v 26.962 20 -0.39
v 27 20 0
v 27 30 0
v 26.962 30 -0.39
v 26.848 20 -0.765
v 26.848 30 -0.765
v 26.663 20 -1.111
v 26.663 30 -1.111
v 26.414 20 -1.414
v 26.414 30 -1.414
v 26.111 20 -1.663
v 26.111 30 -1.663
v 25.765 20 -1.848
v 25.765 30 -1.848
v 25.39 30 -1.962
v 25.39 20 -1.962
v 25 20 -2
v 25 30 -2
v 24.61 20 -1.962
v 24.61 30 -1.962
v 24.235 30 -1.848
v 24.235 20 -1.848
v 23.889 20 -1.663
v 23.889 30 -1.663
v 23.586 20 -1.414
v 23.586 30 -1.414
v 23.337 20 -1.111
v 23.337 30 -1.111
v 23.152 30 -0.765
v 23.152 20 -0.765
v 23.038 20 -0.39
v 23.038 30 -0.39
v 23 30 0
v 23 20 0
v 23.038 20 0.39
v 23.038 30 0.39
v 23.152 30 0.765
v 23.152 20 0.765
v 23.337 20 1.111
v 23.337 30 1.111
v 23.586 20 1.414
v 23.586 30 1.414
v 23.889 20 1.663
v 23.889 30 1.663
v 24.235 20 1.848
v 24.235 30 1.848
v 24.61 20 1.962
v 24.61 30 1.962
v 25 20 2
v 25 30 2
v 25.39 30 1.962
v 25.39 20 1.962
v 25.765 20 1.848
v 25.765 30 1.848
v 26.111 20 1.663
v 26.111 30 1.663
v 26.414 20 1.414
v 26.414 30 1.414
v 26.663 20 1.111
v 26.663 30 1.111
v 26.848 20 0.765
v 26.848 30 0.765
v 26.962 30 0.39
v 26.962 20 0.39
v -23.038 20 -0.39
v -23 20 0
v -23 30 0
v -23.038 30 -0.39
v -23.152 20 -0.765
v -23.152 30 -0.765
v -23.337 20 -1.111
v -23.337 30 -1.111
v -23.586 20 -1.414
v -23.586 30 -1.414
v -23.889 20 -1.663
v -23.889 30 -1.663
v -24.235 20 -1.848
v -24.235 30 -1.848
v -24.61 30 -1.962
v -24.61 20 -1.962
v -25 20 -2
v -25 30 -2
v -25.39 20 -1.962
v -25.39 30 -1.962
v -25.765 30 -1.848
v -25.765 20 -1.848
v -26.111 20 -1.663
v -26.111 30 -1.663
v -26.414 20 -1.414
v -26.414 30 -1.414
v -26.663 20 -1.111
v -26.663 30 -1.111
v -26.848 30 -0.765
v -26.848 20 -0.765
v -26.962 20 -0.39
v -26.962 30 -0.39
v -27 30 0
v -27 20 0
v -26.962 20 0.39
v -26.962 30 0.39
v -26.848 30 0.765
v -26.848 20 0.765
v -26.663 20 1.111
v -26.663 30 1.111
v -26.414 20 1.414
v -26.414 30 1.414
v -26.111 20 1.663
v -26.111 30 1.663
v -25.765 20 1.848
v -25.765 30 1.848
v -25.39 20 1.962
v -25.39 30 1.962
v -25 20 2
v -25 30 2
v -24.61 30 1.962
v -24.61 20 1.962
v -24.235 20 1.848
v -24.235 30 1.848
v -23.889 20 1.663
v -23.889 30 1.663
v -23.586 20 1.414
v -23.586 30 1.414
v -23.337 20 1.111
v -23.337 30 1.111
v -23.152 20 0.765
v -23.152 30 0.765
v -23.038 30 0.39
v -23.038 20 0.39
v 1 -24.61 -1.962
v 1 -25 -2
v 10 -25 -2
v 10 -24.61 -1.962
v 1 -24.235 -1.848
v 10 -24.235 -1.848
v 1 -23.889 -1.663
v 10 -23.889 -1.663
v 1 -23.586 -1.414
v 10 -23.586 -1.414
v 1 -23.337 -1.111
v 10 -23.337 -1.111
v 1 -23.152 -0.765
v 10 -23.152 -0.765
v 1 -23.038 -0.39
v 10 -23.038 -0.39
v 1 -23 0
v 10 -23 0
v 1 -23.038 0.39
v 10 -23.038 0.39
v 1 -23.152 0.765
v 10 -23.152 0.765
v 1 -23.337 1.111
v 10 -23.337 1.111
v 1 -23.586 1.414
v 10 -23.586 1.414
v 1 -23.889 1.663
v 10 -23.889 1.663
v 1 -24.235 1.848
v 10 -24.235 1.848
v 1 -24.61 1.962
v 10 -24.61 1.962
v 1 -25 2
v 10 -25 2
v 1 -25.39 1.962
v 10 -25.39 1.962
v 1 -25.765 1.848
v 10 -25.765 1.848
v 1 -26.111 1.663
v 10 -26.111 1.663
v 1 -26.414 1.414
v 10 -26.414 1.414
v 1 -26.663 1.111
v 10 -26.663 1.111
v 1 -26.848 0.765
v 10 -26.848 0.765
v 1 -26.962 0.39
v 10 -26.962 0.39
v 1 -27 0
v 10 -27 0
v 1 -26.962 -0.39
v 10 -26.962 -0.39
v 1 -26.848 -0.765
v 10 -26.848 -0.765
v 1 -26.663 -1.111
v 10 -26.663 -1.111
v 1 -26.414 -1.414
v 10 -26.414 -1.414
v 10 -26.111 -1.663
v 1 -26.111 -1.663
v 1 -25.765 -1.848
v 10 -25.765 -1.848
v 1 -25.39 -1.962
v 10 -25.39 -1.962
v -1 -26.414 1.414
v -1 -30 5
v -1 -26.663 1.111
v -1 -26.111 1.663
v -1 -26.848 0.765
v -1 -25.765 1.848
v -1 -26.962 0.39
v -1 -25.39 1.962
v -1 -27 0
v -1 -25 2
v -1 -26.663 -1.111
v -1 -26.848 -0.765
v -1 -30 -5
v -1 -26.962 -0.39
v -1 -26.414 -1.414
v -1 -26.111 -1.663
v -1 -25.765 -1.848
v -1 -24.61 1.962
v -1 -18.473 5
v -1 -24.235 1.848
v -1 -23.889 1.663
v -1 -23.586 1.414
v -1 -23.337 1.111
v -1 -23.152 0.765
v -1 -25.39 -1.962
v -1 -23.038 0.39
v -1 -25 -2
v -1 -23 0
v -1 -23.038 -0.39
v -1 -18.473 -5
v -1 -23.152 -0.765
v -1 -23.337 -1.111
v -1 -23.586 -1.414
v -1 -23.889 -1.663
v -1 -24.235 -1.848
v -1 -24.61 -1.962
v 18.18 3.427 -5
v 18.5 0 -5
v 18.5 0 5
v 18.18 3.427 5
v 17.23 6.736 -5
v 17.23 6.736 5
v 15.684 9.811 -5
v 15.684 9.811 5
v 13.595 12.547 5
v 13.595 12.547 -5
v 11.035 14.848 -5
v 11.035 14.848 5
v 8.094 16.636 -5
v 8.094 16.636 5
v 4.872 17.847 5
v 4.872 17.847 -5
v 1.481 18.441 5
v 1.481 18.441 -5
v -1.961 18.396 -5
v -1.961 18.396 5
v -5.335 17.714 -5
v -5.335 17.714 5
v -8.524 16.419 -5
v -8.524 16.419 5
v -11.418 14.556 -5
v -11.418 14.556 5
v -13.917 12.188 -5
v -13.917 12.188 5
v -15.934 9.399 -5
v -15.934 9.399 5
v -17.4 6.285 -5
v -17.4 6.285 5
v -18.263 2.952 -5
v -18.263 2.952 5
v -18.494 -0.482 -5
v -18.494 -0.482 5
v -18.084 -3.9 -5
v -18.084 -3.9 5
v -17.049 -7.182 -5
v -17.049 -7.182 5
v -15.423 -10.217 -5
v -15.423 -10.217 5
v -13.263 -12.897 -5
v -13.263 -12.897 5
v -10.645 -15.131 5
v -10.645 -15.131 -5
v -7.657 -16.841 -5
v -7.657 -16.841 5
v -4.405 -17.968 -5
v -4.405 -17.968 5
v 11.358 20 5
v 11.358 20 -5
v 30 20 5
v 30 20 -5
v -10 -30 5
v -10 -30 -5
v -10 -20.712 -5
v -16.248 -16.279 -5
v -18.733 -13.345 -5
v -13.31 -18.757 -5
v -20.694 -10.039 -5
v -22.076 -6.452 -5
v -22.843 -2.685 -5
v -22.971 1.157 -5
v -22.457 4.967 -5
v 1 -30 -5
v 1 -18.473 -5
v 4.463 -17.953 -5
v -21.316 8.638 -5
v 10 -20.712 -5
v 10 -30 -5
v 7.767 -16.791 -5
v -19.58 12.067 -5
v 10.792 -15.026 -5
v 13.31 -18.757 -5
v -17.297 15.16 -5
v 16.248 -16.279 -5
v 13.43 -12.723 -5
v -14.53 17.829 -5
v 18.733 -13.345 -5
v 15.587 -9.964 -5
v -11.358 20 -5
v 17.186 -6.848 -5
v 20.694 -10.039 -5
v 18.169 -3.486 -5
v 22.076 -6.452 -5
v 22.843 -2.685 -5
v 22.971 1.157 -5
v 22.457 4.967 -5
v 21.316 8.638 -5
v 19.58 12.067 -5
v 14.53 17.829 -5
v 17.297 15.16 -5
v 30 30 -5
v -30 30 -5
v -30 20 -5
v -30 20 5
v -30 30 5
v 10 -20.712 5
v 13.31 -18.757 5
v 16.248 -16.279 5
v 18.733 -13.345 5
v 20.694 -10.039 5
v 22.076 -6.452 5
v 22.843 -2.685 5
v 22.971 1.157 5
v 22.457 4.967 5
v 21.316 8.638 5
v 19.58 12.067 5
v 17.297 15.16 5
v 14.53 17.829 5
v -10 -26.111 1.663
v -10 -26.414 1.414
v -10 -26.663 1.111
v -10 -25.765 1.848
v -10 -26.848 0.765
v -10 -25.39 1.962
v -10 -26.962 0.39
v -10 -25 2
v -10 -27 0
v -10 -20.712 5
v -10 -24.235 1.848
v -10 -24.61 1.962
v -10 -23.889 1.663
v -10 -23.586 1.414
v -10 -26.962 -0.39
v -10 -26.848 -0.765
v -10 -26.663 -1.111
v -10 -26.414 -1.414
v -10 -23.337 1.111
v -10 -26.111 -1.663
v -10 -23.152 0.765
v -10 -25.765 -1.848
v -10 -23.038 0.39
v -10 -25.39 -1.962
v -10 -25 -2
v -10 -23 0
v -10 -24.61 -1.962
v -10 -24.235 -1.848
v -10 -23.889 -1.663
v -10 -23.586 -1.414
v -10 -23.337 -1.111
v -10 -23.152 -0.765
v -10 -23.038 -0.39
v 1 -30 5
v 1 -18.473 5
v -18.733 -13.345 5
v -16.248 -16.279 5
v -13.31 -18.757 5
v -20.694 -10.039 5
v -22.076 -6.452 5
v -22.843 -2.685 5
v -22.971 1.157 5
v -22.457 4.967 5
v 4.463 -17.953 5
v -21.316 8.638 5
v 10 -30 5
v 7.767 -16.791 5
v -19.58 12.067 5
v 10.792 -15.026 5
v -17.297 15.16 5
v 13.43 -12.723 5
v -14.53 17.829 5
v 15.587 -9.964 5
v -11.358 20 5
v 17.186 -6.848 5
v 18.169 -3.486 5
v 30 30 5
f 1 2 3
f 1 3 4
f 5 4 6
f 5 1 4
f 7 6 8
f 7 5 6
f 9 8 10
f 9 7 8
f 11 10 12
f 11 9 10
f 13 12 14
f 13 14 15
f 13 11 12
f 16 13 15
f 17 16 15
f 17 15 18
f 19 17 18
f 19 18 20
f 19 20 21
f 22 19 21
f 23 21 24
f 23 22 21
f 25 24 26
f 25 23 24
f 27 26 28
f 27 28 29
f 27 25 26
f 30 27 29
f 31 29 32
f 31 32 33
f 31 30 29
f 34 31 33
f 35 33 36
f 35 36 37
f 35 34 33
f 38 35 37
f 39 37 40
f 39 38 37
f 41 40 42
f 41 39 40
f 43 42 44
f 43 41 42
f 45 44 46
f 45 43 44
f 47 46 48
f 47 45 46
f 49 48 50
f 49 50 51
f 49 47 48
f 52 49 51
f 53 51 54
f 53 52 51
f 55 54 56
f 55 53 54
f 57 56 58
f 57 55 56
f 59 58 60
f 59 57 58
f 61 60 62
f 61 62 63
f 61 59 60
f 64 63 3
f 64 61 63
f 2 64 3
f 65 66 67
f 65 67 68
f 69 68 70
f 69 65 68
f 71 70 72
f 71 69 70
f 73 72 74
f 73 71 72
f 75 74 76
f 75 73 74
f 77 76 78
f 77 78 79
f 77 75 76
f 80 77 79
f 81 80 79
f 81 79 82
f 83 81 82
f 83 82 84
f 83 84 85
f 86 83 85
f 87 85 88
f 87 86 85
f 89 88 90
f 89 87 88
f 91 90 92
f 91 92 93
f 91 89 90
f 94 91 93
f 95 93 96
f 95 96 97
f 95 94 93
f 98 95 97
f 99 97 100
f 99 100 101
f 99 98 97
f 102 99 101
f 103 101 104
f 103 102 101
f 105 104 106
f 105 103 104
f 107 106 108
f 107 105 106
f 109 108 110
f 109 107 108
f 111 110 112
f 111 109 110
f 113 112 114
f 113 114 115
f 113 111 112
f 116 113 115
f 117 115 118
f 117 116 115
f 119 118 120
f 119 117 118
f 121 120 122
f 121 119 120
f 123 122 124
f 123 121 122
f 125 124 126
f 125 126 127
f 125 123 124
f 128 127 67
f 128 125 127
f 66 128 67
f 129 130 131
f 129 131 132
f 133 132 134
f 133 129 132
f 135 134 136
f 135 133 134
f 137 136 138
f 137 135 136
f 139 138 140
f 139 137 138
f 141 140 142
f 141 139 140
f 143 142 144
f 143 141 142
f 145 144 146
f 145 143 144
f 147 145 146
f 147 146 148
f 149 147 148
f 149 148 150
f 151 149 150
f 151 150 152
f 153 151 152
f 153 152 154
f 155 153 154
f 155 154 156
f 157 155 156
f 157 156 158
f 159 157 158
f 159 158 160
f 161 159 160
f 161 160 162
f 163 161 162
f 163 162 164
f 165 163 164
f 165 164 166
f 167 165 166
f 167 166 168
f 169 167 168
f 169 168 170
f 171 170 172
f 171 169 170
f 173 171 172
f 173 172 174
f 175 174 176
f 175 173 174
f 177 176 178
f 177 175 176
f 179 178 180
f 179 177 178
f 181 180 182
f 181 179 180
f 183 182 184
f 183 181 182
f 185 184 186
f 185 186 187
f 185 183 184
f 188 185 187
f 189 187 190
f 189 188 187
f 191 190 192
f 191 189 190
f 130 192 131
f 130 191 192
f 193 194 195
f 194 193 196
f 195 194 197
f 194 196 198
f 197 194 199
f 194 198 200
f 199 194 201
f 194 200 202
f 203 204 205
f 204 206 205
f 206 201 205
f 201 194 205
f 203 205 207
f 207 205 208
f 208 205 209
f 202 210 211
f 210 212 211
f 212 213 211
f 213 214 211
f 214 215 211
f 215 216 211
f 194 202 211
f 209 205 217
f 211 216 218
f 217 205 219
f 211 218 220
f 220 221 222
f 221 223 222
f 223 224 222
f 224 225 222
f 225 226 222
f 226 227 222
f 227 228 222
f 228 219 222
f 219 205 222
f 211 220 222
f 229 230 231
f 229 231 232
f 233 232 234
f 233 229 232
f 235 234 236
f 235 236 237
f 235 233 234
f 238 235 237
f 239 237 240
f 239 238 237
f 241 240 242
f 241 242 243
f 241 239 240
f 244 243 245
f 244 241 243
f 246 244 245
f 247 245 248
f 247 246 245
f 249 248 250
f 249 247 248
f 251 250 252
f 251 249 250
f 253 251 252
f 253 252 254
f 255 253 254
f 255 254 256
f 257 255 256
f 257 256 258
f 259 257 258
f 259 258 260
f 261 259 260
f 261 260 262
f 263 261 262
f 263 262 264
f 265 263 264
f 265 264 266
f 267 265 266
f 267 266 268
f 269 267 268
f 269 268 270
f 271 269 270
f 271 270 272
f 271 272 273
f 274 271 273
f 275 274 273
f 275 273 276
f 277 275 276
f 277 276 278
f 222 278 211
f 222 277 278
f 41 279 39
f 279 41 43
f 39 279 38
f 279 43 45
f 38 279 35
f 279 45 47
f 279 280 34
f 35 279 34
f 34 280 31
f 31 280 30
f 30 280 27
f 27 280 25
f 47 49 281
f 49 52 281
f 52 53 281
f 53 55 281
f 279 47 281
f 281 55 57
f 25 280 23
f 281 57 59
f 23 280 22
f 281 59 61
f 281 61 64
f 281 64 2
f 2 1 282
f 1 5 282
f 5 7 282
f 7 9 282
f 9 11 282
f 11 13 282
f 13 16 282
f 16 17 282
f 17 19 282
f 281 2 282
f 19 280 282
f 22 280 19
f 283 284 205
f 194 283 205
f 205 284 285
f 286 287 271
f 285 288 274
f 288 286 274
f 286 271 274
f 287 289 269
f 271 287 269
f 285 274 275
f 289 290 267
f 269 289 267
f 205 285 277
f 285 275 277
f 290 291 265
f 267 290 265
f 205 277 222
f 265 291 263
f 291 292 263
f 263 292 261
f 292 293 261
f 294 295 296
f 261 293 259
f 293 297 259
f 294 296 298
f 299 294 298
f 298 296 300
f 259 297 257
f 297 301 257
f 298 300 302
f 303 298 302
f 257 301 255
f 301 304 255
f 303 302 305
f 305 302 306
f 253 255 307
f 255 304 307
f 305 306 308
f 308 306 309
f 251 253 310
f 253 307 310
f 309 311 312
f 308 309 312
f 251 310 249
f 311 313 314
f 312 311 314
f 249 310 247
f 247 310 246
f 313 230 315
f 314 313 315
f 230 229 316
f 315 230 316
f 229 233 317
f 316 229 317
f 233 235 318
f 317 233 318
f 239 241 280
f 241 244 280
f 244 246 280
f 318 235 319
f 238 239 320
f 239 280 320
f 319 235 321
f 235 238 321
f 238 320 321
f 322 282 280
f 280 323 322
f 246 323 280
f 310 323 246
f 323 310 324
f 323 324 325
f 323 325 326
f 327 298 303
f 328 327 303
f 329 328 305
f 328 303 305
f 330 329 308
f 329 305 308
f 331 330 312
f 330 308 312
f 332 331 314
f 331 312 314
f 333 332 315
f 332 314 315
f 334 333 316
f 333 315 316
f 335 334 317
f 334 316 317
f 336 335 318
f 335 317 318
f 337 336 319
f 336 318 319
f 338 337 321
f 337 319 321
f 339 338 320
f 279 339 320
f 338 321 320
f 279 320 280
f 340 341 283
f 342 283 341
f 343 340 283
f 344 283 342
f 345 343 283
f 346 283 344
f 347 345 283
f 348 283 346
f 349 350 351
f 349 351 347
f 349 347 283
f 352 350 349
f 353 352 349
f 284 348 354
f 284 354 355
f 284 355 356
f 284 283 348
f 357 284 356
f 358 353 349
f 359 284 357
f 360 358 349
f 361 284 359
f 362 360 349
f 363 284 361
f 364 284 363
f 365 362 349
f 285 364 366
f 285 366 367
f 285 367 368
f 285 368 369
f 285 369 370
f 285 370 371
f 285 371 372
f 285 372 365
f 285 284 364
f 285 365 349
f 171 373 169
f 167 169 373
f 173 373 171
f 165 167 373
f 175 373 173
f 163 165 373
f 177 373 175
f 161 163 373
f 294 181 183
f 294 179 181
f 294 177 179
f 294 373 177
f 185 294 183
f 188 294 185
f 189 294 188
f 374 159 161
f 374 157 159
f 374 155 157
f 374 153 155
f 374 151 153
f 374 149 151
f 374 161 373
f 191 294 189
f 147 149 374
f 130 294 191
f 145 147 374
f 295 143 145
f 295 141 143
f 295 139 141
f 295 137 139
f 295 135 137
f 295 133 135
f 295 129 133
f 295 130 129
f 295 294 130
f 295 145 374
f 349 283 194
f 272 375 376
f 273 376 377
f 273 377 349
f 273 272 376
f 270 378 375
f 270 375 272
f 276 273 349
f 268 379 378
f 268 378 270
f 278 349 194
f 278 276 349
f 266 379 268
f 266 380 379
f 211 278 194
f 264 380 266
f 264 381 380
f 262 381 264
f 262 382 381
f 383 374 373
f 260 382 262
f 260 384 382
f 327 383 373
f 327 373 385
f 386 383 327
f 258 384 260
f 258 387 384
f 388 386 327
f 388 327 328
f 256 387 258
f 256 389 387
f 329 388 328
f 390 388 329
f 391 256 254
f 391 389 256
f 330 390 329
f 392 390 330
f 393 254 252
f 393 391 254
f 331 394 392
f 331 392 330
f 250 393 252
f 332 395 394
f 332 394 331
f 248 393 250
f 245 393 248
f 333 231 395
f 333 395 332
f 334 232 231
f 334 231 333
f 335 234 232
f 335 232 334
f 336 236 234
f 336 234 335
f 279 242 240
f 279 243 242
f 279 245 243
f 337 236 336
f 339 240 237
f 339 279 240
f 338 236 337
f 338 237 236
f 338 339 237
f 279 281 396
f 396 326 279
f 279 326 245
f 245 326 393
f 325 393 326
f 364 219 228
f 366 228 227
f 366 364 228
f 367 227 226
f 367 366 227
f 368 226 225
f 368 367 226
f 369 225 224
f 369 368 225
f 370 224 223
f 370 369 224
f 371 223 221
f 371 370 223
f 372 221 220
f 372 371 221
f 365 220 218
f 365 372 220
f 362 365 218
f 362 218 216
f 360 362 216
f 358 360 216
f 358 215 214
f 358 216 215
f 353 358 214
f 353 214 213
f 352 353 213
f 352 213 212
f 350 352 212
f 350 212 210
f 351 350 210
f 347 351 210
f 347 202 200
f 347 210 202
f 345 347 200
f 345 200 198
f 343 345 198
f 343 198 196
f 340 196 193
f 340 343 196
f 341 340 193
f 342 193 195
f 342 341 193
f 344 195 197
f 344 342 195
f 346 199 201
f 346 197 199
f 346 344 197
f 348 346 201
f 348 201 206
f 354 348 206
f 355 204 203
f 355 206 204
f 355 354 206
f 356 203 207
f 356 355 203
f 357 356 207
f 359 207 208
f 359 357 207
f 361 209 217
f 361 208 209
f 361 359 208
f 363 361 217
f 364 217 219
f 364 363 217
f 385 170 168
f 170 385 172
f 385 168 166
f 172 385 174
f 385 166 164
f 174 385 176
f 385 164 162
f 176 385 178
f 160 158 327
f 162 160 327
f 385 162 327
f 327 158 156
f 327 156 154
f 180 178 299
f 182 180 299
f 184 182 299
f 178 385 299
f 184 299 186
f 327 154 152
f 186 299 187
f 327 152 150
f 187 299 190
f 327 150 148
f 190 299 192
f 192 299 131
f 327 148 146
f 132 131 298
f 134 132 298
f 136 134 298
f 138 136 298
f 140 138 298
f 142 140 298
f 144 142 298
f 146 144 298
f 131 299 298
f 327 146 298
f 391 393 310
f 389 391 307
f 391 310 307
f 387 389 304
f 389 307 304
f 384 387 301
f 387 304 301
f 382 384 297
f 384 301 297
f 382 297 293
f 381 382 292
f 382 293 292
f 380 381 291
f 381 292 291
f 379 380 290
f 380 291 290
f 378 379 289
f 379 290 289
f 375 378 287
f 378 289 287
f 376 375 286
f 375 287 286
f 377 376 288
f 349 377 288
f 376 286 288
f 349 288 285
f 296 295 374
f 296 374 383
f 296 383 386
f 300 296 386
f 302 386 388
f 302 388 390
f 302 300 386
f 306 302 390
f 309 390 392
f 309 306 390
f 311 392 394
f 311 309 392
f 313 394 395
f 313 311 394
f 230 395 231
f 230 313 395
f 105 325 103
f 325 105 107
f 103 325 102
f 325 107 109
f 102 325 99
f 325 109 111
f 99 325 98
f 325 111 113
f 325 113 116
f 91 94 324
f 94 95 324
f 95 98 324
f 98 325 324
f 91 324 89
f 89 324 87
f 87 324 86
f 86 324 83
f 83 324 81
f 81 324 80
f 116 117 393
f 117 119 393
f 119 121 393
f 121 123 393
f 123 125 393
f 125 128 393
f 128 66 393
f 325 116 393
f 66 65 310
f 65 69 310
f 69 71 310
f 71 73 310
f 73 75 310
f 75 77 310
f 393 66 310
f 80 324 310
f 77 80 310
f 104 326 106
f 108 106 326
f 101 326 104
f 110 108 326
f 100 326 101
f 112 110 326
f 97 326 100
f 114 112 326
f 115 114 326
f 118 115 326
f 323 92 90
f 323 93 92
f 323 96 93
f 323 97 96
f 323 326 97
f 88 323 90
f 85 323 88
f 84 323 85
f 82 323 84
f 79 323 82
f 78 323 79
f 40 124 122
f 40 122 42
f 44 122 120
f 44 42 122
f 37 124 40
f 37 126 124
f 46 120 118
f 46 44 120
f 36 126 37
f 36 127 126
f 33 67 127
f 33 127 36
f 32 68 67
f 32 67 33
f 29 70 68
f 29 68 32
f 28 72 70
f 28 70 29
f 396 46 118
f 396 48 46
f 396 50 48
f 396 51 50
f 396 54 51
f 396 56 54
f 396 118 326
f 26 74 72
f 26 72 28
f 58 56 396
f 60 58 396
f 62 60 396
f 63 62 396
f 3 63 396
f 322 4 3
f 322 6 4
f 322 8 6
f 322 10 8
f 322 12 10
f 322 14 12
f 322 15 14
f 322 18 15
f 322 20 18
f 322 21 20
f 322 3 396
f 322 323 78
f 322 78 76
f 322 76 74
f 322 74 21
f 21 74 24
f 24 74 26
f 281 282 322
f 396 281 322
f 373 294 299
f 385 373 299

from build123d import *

# Parameters (mm, degrees)
CYLINDER002_R     = 2
CYLINDER002_DEPTH = 10
CYLINDER001_R     = 18.5
CYLINDER001_DEPTH = 10
CYLINDER004_R     = 2
CYLINDER004_DEPTH = 20
BOX002_W          = 2
BOX002_H          = 15
BOX002_DEPTH      = 10
CYLINDER003_R     = 2
CYLINDER003_DEPTH = 10
BOX_W             = 60
BOX_H             = 10
BOX_DEPTH         = 10
BOX001_W          = 20
BOX001_H          = 10
BOX001_DEPTH      = 10
CYLINDER_R        = 23
CYLINDER_DEPTH    = 10


with BuildPart() as cylinder002:
    # Cylinder002 → Cylinder002 (new body)
    with BuildSketch(Plane(origin=(25, 20, 0), x_dir=(1, 0, 0), z_dir=(0, 1, 0))):
        Circle(CYLINDER002_R)
    extrude(amount=CYLINDER002_DEPTH)


with BuildPart() as cylinder001:
    # Cylinder001 → Cylinder001 (new body)
    with BuildSketch(Plane.XY.offset(-5)):
        Circle(CYLINDER001_R)
    extrude(amount=CYLINDER001_DEPTH)


with BuildPart() as cylinder004:
    # Cylinder004 → Cylinder004 (new body)
    with BuildSketch(Plane(origin=(-10, -25, 0), x_dir=(0, 0, -1), z_dir=(1, 0, 0))):
        Circle(CYLINDER004_R)
    extrude(amount=CYLINDER004_DEPTH)


with BuildPart() as cube002:
    # Box002 → Box002 (new body)
    with BuildSketch(Plane(origin=(-1, -30, -5), x_dir=(1, 0, 0), z_dir=(0, 0, 1))):
        with Locations((1, 7.5)):
            Rectangle(BOX002_W, BOX002_H)
    extrude(amount=BOX002_DEPTH)


with BuildPart() as negative_fusion:
    # Cylinder003 → Cylinder003 (new body)
    with BuildSketch(Plane(origin=(-25, 20, 0), x_dir=(1, 0, 0), z_dir=(0, 1, 0))):
        Circle(CYLINDER003_R)
    extrude(amount=CYLINDER003_DEPTH)

    # Fusion001: union Cylinder002, Cylinder001, Cylinder004, Cube002
    add(cylinder002.part)
    add(cylinder001.part)
    add(cylinder004.part)
    add(cube002.part)


with BuildPart() as cube:
    # Box → Box (new body)
    with BuildSketch(Plane(origin=(-30, 20, -5), x_dir=(1, 0, 0), z_dir=(0, 0, 1))):
        with Locations((30, 5)):
            Rectangle(BOX_W, BOX_H)
    extrude(amount=BOX_DEPTH)


with BuildPart() as cube001:
    # Box001 → Box001 (new body)
    with BuildSketch(Plane(origin=(-10, -30, -5), x_dir=(1, 0, 0), z_dir=(0, 0, 1))):
        with Locations((10, 5)):
            Rectangle(BOX001_W, BOX001_H)
    extrude(amount=BOX001_DEPTH)


with BuildPart() as cut:
    # Cylinder → Cylinder (new body)
    with BuildSketch(Plane.XY.offset(-5)):
        Circle(CYLINDER_R)
    extrude(amount=CYLINDER_DEPTH)

    # Fusion: union Cube, Cube001
    add(cube.part)
    add(cube001.part)

    # Cut: cut Negative Fusion
    add(negative_fusion.part, mode=Mode.SUBTRACT)


solid = cut.part
